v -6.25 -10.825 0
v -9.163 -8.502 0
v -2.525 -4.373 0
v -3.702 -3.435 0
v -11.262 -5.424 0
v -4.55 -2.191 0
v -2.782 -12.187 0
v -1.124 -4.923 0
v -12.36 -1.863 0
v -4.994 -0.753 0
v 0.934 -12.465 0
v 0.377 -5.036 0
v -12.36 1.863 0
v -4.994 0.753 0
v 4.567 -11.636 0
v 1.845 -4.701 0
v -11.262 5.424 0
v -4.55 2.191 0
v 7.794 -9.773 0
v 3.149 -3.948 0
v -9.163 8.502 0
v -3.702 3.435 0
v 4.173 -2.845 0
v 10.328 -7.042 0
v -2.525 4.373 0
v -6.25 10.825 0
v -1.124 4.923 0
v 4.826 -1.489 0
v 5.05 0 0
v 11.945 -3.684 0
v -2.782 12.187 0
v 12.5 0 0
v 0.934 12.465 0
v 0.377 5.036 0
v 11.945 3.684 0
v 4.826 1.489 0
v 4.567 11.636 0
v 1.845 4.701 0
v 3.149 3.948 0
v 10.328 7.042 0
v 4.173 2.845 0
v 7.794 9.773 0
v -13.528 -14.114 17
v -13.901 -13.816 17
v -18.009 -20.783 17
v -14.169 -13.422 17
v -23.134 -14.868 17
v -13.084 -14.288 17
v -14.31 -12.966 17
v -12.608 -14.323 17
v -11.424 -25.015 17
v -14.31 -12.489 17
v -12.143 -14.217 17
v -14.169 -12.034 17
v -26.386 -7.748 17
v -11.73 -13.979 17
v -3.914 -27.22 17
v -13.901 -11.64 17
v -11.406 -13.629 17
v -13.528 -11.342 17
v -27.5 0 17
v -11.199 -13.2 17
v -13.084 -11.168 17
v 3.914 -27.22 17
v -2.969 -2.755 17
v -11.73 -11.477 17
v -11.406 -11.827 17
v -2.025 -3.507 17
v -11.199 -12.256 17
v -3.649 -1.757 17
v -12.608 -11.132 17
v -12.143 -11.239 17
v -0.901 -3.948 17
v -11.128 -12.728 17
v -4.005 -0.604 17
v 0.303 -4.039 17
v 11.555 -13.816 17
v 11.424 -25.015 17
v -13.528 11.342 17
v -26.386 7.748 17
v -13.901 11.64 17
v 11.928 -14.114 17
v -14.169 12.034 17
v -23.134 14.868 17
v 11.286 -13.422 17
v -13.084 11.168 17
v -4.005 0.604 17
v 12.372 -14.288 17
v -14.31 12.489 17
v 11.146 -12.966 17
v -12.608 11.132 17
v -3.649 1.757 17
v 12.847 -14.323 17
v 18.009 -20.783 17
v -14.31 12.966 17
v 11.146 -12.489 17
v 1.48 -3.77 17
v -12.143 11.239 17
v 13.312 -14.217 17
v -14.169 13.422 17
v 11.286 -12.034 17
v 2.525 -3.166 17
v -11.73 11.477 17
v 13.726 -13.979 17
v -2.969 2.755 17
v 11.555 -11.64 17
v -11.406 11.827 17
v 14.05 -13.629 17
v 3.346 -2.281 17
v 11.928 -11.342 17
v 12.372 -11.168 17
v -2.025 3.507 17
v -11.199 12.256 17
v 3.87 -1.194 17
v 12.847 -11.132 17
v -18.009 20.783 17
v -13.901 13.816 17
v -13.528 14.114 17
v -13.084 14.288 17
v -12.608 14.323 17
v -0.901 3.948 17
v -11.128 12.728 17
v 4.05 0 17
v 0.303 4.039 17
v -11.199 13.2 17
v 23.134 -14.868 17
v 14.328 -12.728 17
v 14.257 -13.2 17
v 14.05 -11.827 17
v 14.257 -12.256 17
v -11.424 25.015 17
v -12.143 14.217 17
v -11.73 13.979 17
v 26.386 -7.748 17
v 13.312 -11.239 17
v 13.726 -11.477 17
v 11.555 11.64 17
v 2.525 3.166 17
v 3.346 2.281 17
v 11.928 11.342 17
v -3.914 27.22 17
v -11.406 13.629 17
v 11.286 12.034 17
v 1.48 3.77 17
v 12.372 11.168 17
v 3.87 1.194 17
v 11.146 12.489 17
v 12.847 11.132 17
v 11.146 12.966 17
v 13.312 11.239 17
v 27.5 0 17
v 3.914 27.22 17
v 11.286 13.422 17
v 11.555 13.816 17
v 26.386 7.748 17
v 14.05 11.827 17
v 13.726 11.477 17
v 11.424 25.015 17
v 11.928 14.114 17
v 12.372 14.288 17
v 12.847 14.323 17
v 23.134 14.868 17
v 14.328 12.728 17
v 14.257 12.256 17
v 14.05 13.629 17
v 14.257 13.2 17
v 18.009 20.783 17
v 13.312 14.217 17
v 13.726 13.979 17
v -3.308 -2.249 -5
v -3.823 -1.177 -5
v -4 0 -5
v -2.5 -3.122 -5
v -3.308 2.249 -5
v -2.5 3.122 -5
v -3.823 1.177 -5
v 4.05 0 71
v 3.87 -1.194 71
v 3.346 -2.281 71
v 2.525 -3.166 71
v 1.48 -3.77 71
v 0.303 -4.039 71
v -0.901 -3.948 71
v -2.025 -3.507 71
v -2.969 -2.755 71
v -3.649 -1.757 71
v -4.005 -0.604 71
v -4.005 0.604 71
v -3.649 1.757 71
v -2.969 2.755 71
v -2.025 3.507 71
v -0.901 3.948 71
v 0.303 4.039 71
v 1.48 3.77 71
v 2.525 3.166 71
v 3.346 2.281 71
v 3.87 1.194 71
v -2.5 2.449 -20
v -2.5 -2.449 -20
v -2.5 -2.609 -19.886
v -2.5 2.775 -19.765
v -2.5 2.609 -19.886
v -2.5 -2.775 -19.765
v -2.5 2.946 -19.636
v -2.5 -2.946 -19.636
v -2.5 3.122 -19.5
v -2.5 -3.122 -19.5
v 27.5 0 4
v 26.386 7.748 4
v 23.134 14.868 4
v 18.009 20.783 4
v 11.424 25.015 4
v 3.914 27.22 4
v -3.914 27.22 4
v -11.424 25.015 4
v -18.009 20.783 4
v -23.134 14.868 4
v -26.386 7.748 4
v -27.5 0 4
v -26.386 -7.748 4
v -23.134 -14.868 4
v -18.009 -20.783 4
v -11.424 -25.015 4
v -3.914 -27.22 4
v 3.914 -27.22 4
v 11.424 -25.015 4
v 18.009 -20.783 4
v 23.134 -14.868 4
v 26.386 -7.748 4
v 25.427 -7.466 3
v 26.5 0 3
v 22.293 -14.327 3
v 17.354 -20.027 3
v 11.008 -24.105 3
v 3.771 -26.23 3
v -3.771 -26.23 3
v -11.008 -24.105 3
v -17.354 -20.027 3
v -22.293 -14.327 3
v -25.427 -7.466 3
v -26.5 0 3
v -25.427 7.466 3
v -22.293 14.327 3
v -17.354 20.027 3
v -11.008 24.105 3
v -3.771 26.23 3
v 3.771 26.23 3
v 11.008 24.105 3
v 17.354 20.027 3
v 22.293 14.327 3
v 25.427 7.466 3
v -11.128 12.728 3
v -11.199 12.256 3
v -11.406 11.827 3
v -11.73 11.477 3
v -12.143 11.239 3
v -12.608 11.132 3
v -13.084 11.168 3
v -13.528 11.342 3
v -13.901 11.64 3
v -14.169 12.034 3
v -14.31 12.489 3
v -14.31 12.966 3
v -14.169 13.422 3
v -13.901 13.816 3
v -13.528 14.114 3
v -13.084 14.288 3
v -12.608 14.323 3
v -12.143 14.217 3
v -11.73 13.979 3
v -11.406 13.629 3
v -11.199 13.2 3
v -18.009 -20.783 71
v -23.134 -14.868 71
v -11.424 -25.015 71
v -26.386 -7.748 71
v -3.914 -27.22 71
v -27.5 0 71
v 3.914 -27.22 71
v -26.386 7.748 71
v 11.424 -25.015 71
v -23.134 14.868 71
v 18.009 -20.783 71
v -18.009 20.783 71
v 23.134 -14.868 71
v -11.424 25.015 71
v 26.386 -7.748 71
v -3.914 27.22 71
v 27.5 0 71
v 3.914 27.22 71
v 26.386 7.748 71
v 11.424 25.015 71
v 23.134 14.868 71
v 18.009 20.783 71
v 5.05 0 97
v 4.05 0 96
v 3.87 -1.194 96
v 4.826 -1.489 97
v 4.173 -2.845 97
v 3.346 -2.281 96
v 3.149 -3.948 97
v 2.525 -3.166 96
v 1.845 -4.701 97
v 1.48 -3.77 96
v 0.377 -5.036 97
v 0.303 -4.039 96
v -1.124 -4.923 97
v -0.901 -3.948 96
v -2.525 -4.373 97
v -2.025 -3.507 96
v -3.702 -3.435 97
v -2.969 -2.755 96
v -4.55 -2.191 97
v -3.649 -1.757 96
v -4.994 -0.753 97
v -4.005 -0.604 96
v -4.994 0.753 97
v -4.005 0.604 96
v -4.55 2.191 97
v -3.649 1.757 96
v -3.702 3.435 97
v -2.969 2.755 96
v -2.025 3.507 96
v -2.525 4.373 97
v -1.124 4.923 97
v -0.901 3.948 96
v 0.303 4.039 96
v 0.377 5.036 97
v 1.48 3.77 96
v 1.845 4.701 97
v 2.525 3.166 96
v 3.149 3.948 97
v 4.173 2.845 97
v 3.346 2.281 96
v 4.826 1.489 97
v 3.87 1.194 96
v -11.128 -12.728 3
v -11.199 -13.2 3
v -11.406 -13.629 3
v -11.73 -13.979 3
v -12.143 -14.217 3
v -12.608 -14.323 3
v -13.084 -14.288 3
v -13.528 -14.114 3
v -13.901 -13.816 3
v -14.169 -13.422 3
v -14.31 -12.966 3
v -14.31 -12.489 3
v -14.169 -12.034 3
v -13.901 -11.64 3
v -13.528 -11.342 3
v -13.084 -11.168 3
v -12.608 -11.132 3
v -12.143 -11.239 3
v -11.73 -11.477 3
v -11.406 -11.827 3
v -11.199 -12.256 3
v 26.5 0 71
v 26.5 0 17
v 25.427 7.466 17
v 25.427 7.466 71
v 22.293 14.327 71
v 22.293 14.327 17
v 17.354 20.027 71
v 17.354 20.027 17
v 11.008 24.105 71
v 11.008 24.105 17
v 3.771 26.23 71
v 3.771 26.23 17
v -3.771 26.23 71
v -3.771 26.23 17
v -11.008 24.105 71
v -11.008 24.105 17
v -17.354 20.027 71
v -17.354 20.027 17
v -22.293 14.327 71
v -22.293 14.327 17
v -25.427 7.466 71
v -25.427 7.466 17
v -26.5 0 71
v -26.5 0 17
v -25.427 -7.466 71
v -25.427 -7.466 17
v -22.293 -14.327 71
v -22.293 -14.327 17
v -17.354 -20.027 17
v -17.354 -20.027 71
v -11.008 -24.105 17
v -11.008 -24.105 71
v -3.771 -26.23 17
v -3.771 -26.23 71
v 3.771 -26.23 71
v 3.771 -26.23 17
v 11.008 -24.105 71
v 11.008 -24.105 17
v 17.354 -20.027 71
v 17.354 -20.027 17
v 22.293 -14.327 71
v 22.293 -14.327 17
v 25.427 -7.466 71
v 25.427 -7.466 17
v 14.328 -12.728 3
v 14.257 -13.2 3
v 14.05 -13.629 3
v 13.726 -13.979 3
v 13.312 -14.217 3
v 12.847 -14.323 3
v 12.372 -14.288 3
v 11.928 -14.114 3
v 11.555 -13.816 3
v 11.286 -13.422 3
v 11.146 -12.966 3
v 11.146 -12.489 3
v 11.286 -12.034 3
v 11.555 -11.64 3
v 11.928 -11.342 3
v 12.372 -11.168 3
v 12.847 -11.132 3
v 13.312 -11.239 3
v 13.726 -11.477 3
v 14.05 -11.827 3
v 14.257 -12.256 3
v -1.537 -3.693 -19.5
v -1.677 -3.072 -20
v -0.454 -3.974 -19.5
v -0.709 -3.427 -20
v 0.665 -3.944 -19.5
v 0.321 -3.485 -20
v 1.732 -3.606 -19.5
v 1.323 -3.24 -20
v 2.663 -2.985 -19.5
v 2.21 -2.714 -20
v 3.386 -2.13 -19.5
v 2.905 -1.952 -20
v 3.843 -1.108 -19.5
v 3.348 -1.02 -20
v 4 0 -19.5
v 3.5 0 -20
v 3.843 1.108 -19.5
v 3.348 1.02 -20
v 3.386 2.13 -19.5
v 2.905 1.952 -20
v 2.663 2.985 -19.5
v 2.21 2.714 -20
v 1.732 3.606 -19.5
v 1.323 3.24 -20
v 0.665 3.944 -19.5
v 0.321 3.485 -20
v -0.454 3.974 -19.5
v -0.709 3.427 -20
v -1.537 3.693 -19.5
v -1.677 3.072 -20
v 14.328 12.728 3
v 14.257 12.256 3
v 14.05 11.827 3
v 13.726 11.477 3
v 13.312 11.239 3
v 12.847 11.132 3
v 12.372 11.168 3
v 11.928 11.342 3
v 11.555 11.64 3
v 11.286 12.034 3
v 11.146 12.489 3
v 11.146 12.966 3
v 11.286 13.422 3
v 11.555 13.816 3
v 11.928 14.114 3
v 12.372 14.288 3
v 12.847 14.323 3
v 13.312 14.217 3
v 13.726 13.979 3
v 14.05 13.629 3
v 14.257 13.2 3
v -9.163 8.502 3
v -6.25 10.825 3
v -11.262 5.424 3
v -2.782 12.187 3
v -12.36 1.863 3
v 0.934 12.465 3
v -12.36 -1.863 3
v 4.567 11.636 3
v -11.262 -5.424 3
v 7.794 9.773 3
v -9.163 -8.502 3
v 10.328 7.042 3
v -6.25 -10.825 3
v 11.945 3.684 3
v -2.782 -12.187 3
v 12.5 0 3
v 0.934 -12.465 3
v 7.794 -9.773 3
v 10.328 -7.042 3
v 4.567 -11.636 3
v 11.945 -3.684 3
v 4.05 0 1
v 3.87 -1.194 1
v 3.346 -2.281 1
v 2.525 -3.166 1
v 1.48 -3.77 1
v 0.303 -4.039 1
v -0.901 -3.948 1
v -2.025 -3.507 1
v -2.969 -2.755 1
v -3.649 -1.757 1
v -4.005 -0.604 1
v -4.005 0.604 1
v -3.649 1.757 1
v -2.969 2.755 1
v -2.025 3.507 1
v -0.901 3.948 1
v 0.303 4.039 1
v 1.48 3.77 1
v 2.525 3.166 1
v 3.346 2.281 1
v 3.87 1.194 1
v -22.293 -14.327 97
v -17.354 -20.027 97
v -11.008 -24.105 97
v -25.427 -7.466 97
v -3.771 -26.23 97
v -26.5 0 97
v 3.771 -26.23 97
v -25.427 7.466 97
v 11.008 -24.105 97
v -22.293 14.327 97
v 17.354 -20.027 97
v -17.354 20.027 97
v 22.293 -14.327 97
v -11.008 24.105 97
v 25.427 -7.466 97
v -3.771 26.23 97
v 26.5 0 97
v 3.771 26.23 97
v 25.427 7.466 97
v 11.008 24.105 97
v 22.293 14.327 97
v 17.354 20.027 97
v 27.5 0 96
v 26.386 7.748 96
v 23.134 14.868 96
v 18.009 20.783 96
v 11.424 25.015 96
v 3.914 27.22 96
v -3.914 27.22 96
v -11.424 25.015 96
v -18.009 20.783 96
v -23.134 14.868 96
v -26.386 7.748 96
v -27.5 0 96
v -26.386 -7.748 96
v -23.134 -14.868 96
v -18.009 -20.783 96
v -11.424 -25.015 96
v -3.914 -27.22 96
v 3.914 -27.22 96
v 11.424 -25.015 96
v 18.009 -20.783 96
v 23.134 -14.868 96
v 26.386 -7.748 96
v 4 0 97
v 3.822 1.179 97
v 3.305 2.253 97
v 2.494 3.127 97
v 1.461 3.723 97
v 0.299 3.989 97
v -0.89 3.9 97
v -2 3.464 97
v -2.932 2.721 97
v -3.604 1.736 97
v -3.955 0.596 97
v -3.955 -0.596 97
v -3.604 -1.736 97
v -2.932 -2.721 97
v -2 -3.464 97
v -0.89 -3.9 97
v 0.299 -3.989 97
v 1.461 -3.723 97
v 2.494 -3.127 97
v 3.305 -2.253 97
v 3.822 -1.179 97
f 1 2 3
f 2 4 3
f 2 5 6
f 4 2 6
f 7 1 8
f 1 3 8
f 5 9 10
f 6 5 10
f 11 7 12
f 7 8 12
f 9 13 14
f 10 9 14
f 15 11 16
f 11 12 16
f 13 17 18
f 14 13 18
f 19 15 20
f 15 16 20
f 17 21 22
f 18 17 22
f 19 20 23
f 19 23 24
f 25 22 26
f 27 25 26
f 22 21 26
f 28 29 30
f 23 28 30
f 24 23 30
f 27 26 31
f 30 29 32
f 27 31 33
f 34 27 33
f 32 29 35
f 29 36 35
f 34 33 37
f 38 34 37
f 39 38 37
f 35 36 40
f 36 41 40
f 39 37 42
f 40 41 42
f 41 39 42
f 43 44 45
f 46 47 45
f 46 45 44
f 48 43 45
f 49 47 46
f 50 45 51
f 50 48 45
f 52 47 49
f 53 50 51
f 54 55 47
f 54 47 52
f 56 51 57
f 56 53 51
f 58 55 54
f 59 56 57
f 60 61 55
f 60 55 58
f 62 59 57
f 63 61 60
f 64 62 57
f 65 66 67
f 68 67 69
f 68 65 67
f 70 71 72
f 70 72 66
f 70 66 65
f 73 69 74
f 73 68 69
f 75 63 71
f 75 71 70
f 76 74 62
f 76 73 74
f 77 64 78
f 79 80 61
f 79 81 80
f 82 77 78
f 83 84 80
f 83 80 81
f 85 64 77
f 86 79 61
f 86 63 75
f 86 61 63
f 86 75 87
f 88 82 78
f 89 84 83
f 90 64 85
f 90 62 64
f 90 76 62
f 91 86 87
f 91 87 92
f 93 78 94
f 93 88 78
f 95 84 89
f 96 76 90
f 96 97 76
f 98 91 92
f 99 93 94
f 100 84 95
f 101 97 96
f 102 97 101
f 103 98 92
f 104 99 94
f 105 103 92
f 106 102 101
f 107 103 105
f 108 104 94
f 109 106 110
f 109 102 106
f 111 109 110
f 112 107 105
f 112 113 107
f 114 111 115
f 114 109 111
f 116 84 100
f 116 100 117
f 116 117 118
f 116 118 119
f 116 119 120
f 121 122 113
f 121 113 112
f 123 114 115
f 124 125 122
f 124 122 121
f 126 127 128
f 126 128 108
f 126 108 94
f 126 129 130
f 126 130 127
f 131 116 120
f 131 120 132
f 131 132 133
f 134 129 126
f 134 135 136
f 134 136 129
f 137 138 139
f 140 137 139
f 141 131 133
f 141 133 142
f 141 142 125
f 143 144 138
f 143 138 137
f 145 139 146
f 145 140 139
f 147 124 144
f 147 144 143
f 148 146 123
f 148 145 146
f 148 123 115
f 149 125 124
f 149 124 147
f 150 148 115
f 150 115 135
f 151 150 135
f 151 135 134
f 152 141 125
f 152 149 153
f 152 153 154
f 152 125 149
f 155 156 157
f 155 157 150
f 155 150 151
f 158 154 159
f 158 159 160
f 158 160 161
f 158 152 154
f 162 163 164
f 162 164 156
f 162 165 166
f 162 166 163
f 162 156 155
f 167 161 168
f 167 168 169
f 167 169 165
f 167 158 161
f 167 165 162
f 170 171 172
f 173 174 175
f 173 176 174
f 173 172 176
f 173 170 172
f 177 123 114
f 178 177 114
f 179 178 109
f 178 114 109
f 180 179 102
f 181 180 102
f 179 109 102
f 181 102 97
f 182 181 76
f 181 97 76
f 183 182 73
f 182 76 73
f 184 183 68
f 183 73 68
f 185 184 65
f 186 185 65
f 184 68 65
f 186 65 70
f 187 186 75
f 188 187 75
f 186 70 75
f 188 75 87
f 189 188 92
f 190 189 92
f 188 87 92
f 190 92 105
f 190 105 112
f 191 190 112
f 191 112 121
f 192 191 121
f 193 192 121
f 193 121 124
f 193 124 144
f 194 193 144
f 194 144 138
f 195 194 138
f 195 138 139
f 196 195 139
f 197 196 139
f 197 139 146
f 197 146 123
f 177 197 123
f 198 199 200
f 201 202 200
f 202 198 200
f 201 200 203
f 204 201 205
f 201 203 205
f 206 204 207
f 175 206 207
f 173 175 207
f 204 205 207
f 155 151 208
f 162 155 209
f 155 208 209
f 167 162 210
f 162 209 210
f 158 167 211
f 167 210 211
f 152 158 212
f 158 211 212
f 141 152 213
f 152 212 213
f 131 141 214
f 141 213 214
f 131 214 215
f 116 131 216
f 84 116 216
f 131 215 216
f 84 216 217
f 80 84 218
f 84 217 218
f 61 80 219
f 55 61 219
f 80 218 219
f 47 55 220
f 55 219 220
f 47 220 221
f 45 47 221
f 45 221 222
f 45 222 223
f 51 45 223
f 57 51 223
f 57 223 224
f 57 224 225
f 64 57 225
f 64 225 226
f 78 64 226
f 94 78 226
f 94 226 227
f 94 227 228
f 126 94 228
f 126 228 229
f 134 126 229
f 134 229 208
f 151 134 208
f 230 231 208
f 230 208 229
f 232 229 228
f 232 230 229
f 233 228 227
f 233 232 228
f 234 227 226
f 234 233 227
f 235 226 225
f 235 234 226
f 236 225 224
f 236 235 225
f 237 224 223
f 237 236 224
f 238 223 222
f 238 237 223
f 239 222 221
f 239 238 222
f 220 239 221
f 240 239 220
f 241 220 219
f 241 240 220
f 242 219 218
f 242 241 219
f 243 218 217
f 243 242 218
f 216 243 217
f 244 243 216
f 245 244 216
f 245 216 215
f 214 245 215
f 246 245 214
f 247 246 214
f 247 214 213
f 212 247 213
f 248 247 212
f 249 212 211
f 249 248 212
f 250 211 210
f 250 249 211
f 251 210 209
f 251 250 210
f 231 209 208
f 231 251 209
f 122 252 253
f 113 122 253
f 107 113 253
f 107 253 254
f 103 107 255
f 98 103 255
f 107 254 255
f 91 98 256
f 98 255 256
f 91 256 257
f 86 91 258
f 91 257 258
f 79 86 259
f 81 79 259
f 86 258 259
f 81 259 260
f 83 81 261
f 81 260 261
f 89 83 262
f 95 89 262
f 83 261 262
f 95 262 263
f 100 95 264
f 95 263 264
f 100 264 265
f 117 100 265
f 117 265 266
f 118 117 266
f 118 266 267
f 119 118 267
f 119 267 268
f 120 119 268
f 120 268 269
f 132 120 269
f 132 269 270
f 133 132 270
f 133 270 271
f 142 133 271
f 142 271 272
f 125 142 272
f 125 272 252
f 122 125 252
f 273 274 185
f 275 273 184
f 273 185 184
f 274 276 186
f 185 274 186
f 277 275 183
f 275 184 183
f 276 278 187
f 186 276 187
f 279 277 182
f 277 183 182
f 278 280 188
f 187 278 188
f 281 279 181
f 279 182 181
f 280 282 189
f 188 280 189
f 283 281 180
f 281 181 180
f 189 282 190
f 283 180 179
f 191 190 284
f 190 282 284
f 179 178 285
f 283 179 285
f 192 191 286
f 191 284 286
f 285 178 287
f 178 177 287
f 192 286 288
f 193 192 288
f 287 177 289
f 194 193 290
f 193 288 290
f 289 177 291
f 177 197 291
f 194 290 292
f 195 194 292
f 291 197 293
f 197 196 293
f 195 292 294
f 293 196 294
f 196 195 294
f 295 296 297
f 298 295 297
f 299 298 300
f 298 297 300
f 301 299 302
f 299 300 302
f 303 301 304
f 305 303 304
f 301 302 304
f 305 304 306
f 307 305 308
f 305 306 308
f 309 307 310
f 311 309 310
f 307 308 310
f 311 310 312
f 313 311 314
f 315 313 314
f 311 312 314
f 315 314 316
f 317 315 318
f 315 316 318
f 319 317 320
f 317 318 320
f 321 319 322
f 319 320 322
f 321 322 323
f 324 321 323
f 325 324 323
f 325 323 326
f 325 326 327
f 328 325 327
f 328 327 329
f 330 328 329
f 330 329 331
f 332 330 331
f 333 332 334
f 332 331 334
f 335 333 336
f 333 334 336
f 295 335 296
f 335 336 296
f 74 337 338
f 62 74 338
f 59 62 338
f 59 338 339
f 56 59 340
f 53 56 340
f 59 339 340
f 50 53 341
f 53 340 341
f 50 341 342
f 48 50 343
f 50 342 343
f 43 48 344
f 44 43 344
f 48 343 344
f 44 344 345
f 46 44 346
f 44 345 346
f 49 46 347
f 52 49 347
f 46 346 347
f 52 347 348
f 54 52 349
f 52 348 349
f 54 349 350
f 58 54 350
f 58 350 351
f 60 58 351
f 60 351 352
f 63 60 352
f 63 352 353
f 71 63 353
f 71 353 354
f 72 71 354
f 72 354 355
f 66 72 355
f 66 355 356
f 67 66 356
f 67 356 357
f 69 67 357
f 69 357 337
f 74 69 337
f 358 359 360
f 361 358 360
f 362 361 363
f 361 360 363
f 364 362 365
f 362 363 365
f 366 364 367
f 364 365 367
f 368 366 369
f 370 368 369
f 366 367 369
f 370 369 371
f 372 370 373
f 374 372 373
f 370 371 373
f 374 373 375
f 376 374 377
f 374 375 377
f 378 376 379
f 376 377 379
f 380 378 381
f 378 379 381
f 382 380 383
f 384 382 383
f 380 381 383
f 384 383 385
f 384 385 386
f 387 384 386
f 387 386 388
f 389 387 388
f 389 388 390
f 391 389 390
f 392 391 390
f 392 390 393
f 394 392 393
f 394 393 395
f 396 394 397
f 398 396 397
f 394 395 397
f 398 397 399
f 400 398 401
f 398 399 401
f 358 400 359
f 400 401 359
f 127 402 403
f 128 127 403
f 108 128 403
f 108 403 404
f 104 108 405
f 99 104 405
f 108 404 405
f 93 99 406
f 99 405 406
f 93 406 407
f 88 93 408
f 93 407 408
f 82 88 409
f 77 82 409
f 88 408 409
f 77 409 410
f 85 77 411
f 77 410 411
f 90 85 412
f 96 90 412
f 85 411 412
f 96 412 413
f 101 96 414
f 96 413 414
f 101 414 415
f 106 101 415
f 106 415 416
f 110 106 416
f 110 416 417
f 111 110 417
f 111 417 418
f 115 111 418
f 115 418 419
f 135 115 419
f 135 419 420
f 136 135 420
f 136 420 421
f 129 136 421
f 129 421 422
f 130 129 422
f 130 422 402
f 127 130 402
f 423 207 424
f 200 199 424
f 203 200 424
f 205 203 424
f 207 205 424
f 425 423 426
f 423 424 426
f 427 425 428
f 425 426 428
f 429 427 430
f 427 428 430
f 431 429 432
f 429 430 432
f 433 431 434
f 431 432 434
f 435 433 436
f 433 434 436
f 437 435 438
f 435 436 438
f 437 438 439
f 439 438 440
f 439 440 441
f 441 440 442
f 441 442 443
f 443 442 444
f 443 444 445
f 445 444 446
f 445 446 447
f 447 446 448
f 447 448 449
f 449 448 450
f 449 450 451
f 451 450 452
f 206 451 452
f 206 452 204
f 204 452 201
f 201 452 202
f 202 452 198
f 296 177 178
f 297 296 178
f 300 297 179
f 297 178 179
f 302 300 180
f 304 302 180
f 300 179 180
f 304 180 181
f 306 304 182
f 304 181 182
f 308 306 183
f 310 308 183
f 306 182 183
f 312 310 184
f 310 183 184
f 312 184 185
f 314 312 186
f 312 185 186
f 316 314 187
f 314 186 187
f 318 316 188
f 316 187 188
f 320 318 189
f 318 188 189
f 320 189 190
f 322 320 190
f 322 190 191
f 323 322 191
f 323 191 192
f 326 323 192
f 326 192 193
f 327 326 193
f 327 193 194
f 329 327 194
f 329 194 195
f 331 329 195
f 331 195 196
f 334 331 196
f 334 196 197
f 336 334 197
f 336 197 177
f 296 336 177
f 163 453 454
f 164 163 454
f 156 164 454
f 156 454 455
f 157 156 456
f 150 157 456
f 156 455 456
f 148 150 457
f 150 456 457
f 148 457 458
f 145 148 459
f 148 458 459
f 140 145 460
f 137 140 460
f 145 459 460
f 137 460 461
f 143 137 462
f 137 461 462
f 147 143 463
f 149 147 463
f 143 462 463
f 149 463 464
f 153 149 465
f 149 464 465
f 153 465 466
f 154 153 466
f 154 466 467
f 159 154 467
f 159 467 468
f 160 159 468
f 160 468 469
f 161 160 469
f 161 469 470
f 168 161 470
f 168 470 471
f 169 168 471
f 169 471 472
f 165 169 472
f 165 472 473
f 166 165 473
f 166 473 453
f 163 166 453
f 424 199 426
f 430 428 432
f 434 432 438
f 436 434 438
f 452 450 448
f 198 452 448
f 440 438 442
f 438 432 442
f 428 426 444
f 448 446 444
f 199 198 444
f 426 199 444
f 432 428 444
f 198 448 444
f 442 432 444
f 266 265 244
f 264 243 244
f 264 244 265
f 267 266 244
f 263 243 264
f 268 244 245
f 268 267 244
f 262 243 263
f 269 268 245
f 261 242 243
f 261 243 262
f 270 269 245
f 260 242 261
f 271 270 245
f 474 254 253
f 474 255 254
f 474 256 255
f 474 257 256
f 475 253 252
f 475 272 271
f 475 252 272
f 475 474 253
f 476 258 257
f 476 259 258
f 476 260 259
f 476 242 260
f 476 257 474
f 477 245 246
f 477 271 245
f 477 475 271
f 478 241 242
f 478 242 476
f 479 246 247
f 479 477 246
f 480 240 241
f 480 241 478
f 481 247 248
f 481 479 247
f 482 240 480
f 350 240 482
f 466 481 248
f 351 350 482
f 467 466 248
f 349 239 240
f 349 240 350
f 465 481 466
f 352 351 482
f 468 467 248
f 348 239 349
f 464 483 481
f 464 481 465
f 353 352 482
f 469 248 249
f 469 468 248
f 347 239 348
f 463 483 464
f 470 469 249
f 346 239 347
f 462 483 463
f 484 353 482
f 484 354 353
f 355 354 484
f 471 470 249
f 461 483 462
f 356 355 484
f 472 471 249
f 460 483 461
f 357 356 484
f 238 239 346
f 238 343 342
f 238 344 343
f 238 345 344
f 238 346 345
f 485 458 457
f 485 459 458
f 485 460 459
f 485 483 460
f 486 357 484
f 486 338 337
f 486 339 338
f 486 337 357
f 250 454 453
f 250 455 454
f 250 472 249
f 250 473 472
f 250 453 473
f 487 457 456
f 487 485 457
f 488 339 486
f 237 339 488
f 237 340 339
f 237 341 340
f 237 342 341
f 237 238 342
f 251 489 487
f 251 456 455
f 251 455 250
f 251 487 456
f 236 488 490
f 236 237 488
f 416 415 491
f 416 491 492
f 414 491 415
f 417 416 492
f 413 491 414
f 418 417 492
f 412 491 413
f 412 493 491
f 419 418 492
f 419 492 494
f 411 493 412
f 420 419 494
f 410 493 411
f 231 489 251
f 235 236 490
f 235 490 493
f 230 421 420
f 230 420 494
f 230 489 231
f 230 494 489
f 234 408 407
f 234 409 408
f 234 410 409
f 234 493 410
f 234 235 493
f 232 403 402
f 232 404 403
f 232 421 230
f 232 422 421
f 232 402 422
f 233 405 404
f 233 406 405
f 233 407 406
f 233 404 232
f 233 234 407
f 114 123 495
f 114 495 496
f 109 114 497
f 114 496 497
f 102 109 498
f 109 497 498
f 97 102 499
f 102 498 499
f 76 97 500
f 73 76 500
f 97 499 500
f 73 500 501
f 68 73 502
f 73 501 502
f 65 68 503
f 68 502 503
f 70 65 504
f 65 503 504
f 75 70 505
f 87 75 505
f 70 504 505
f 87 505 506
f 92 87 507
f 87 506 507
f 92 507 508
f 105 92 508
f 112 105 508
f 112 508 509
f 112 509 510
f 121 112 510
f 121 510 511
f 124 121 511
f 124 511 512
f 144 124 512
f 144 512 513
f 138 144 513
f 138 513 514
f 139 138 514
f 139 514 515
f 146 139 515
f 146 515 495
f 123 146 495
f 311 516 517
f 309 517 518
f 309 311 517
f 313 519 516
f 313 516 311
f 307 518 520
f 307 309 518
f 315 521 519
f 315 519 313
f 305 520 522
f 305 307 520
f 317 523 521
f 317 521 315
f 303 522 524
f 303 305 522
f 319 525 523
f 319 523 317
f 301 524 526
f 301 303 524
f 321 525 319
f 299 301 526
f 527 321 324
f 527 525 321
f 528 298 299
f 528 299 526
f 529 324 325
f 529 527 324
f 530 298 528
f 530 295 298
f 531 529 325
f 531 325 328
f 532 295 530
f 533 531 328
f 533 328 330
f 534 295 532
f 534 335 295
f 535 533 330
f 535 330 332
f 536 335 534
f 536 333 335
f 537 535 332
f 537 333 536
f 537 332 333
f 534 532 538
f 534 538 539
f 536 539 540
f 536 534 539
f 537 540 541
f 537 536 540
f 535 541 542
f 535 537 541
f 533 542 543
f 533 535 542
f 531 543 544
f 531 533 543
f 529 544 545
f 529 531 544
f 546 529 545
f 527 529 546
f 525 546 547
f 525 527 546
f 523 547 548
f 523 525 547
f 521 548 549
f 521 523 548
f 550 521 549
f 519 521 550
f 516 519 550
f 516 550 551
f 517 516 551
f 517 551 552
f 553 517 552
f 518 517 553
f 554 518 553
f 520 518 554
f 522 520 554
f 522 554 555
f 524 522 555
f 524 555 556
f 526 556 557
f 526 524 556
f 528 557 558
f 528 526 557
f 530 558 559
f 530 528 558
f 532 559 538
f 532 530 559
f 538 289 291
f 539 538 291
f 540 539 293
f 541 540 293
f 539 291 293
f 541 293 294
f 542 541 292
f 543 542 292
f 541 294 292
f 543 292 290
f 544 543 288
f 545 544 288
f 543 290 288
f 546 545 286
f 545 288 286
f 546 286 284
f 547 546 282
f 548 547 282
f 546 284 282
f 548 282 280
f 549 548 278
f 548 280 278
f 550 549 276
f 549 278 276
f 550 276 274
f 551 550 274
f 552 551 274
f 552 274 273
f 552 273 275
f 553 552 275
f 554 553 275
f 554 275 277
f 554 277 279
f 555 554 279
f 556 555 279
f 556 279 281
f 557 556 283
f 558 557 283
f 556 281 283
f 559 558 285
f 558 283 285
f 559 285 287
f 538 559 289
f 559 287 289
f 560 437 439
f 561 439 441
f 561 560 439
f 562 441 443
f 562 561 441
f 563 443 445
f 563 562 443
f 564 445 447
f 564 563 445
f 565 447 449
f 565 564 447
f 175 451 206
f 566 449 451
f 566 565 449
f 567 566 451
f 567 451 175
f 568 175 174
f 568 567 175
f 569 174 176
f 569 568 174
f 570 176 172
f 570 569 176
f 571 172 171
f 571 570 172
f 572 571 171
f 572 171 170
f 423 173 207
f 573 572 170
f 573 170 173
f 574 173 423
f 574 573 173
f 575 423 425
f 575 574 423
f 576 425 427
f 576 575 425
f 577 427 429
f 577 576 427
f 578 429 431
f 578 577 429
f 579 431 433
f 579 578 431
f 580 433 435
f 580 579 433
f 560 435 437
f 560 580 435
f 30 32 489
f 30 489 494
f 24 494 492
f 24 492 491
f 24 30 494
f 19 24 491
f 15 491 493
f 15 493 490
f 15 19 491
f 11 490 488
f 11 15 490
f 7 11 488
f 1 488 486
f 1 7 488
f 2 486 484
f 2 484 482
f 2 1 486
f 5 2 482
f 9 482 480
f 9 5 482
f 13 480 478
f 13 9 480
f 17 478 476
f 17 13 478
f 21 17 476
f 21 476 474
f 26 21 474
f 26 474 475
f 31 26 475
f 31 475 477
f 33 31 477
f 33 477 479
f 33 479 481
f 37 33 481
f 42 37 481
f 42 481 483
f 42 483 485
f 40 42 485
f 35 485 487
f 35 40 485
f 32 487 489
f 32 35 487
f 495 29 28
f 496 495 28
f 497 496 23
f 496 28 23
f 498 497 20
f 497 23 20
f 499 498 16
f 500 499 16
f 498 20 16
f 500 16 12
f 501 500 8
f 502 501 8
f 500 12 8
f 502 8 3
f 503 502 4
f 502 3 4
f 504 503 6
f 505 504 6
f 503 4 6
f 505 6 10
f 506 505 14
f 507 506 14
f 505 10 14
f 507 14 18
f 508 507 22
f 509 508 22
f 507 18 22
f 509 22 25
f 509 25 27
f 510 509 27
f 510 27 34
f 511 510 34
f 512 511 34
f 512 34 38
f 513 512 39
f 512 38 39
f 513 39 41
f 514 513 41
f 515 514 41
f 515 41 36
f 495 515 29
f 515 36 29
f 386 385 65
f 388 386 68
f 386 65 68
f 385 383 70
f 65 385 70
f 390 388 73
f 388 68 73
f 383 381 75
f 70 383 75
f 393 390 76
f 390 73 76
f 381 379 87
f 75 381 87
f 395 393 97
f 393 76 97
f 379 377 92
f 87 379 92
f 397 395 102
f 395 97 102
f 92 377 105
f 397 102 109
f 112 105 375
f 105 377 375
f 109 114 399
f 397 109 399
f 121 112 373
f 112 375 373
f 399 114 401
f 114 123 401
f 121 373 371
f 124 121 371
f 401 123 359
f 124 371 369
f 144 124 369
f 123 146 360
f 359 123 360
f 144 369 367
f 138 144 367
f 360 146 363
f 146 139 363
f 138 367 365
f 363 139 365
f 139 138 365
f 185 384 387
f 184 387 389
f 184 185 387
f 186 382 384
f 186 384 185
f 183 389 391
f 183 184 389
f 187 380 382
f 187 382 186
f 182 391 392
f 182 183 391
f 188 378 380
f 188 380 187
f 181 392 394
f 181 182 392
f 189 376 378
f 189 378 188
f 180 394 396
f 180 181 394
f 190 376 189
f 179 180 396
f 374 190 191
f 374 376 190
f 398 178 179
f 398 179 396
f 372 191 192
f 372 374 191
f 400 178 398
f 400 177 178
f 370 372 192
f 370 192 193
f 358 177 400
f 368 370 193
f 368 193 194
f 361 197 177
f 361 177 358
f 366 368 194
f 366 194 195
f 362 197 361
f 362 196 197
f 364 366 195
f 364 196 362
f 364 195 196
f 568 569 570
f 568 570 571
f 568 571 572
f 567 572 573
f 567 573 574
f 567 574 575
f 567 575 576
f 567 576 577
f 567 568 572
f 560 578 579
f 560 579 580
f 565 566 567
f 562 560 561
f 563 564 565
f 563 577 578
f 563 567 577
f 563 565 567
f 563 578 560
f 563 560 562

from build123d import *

# Parameters (mm, degrees)
F0_R       = 27.5
F1_DEPTH   = 17
F2_R       = 27.5
F2_R_2     = 12.5
F3_DEPTH   = 3
F4_R       = 26.5
F5_DEPTH   = 54
F6_R       = 27.5
F7_DEPTH   = 26
F8_SIZE    = 1
F8_2_SIZE  = 1
F9_R       = 4.05
F10_DEPTH  = 97.001
F11_SIZE   = 1
F11_2_SIZE = 1
F12_R      = 4
F13_DEPTH  = 117
F14_SIZE   = 0.5
F16_DEPTH  = 15
F17_R      = 1.6
F18_DEPTH  = 94.001


with BuildPart() as f1:
    # F0 (on Top) → F1 (new body)
    with BuildSketch(Plane.XY):
        Circle(F0_R)
    extrude(amount=F1_DEPTH)

    # F2 (on face) → F3 (cut)
    with BuildSketch(Plane(origin=(0, 0, 0), x_dir=(1, 0, 0), z_dir=(0, 0, -1))):
        Circle(F2_R)
        Circle(F2_R_2, mode=Mode.SUBTRACT)
    extrude(amount=-F3_DEPTH, mode=Mode.SUBTRACT)

    # F8#2
    f8_2_edges = [f1.edges().sort_by_distance(p)[0] for p in [
        (-27.5, 0, 3),
    ]]
    chamfer(f8_2_edges, length=F8_2_SIZE)


with BuildPart() as f5:
    # F4 (on face) → F5 (new body)
    with BuildSketch(Plane.XY.offset(17)):
        Circle(F4_R)
    extrude(amount=F5_DEPTH)


with BuildPart() as f7:
    # F6 (on face) → F7 (new body)
    with BuildSketch(Plane.XY.offset(71)):
        Circle(F6_R)
    extrude(amount=F7_DEPTH)

    # F8
    f8_edges = [f7.edges().sort_by_distance(p)[0] for p in [
        (-27.5, 0, 97),
    ]]
    chamfer(f8_edges, length=F8_SIZE)


with BuildPart() as f10_tool:
    # F9 (on face) → F10 (new body, through all)
    with BuildSketch(Plane(origin=(0, 0, 0), x_dir=(1, 0, 0), z_dir=(0, 0, -1))):
        Circle(F9_R)
    extrude(amount=-F10_DEPTH)


with BuildPart() as f1_1:
    add(f1.part)

    # F10: cut by f10_tool
    add(f10_tool.part, mode=Mode.SUBTRACT)

    # F11#2
    f11_2_edges = [f1_1.edges().sort_by_distance(p)[0] for p in [
        (-4.05, 0, 0),
    ]]
    chamfer(f11_2_edges, length=F11_2_SIZE)

    # F17 (on face) → F18 (cut, through all)
    with BuildSketch(Plane(origin=(0, 0, 3), x_dir=(1, 0, 0), z_dir=(0, 0, -1))):
        with Locations((-12.7279220614, 12.7279220614)):
            Circle(F17_R)
        with Locations((-12.7279220614, -12.7279220614)):
            Circle(F17_R)
        with Locations((12.7279220614, -12.7279220614)):
            Circle(F17_R)
        with Locations((12.7279220614, 12.7279220614)):
            Circle(F17_R)
    extrude(amount=-F18_DEPTH, mode=Mode.SUBTRACT)


with BuildPart() as f5_1:
    add(f5.part)

    # F10: cut by f10_tool
    add(f10_tool.part, mode=Mode.SUBTRACT)


with BuildPart() as f7_1:
    add(f7.part)

    # F10: cut by f10_tool
    add(f10_tool.part, mode=Mode.SUBTRACT)

    # F11
    f11_edges = [f7_1.edges().sort_by_distance(p)[0] for p in [
        (-4.05, 0, 97),
    ]]
    chamfer(f11_edges, length=F11_SIZE)


with BuildPart() as f13:
    # F12 (on face) → F13 (new body)
    with BuildSketch(Plane.XY.offset(97)):
        Circle(F12_R)
    extrude(amount=-F13_DEPTH)

    # F14
    f14_edges = [f13.edges().sort_by_distance(p)[0] for p in [
        (-4, 0, -20),
    ]]
    chamfer(f14_edges, length=F14_SIZE)

    # F15 (on face) → F16 (cut)
    with BuildSketch(Plane(origin=(0, 0, -20), x_dir=(1, 0, 0), z_dir=(0, 0, -1))):
        with BuildLine():
            Line((-2.5, -6.5148589839), (-2.5, 6.5148589839))
            ThreePointArc((-2.5, 6.5148589839), (-6.9780647446, 0), (-2.5, -6.5148589839))
        make_face()
    extrude(amount=-F16_DEPTH, mode=Mode.SUBTRACT)


solid = Compound([f1_1.part, f5_1.part, f7_1.part, f13.part])
